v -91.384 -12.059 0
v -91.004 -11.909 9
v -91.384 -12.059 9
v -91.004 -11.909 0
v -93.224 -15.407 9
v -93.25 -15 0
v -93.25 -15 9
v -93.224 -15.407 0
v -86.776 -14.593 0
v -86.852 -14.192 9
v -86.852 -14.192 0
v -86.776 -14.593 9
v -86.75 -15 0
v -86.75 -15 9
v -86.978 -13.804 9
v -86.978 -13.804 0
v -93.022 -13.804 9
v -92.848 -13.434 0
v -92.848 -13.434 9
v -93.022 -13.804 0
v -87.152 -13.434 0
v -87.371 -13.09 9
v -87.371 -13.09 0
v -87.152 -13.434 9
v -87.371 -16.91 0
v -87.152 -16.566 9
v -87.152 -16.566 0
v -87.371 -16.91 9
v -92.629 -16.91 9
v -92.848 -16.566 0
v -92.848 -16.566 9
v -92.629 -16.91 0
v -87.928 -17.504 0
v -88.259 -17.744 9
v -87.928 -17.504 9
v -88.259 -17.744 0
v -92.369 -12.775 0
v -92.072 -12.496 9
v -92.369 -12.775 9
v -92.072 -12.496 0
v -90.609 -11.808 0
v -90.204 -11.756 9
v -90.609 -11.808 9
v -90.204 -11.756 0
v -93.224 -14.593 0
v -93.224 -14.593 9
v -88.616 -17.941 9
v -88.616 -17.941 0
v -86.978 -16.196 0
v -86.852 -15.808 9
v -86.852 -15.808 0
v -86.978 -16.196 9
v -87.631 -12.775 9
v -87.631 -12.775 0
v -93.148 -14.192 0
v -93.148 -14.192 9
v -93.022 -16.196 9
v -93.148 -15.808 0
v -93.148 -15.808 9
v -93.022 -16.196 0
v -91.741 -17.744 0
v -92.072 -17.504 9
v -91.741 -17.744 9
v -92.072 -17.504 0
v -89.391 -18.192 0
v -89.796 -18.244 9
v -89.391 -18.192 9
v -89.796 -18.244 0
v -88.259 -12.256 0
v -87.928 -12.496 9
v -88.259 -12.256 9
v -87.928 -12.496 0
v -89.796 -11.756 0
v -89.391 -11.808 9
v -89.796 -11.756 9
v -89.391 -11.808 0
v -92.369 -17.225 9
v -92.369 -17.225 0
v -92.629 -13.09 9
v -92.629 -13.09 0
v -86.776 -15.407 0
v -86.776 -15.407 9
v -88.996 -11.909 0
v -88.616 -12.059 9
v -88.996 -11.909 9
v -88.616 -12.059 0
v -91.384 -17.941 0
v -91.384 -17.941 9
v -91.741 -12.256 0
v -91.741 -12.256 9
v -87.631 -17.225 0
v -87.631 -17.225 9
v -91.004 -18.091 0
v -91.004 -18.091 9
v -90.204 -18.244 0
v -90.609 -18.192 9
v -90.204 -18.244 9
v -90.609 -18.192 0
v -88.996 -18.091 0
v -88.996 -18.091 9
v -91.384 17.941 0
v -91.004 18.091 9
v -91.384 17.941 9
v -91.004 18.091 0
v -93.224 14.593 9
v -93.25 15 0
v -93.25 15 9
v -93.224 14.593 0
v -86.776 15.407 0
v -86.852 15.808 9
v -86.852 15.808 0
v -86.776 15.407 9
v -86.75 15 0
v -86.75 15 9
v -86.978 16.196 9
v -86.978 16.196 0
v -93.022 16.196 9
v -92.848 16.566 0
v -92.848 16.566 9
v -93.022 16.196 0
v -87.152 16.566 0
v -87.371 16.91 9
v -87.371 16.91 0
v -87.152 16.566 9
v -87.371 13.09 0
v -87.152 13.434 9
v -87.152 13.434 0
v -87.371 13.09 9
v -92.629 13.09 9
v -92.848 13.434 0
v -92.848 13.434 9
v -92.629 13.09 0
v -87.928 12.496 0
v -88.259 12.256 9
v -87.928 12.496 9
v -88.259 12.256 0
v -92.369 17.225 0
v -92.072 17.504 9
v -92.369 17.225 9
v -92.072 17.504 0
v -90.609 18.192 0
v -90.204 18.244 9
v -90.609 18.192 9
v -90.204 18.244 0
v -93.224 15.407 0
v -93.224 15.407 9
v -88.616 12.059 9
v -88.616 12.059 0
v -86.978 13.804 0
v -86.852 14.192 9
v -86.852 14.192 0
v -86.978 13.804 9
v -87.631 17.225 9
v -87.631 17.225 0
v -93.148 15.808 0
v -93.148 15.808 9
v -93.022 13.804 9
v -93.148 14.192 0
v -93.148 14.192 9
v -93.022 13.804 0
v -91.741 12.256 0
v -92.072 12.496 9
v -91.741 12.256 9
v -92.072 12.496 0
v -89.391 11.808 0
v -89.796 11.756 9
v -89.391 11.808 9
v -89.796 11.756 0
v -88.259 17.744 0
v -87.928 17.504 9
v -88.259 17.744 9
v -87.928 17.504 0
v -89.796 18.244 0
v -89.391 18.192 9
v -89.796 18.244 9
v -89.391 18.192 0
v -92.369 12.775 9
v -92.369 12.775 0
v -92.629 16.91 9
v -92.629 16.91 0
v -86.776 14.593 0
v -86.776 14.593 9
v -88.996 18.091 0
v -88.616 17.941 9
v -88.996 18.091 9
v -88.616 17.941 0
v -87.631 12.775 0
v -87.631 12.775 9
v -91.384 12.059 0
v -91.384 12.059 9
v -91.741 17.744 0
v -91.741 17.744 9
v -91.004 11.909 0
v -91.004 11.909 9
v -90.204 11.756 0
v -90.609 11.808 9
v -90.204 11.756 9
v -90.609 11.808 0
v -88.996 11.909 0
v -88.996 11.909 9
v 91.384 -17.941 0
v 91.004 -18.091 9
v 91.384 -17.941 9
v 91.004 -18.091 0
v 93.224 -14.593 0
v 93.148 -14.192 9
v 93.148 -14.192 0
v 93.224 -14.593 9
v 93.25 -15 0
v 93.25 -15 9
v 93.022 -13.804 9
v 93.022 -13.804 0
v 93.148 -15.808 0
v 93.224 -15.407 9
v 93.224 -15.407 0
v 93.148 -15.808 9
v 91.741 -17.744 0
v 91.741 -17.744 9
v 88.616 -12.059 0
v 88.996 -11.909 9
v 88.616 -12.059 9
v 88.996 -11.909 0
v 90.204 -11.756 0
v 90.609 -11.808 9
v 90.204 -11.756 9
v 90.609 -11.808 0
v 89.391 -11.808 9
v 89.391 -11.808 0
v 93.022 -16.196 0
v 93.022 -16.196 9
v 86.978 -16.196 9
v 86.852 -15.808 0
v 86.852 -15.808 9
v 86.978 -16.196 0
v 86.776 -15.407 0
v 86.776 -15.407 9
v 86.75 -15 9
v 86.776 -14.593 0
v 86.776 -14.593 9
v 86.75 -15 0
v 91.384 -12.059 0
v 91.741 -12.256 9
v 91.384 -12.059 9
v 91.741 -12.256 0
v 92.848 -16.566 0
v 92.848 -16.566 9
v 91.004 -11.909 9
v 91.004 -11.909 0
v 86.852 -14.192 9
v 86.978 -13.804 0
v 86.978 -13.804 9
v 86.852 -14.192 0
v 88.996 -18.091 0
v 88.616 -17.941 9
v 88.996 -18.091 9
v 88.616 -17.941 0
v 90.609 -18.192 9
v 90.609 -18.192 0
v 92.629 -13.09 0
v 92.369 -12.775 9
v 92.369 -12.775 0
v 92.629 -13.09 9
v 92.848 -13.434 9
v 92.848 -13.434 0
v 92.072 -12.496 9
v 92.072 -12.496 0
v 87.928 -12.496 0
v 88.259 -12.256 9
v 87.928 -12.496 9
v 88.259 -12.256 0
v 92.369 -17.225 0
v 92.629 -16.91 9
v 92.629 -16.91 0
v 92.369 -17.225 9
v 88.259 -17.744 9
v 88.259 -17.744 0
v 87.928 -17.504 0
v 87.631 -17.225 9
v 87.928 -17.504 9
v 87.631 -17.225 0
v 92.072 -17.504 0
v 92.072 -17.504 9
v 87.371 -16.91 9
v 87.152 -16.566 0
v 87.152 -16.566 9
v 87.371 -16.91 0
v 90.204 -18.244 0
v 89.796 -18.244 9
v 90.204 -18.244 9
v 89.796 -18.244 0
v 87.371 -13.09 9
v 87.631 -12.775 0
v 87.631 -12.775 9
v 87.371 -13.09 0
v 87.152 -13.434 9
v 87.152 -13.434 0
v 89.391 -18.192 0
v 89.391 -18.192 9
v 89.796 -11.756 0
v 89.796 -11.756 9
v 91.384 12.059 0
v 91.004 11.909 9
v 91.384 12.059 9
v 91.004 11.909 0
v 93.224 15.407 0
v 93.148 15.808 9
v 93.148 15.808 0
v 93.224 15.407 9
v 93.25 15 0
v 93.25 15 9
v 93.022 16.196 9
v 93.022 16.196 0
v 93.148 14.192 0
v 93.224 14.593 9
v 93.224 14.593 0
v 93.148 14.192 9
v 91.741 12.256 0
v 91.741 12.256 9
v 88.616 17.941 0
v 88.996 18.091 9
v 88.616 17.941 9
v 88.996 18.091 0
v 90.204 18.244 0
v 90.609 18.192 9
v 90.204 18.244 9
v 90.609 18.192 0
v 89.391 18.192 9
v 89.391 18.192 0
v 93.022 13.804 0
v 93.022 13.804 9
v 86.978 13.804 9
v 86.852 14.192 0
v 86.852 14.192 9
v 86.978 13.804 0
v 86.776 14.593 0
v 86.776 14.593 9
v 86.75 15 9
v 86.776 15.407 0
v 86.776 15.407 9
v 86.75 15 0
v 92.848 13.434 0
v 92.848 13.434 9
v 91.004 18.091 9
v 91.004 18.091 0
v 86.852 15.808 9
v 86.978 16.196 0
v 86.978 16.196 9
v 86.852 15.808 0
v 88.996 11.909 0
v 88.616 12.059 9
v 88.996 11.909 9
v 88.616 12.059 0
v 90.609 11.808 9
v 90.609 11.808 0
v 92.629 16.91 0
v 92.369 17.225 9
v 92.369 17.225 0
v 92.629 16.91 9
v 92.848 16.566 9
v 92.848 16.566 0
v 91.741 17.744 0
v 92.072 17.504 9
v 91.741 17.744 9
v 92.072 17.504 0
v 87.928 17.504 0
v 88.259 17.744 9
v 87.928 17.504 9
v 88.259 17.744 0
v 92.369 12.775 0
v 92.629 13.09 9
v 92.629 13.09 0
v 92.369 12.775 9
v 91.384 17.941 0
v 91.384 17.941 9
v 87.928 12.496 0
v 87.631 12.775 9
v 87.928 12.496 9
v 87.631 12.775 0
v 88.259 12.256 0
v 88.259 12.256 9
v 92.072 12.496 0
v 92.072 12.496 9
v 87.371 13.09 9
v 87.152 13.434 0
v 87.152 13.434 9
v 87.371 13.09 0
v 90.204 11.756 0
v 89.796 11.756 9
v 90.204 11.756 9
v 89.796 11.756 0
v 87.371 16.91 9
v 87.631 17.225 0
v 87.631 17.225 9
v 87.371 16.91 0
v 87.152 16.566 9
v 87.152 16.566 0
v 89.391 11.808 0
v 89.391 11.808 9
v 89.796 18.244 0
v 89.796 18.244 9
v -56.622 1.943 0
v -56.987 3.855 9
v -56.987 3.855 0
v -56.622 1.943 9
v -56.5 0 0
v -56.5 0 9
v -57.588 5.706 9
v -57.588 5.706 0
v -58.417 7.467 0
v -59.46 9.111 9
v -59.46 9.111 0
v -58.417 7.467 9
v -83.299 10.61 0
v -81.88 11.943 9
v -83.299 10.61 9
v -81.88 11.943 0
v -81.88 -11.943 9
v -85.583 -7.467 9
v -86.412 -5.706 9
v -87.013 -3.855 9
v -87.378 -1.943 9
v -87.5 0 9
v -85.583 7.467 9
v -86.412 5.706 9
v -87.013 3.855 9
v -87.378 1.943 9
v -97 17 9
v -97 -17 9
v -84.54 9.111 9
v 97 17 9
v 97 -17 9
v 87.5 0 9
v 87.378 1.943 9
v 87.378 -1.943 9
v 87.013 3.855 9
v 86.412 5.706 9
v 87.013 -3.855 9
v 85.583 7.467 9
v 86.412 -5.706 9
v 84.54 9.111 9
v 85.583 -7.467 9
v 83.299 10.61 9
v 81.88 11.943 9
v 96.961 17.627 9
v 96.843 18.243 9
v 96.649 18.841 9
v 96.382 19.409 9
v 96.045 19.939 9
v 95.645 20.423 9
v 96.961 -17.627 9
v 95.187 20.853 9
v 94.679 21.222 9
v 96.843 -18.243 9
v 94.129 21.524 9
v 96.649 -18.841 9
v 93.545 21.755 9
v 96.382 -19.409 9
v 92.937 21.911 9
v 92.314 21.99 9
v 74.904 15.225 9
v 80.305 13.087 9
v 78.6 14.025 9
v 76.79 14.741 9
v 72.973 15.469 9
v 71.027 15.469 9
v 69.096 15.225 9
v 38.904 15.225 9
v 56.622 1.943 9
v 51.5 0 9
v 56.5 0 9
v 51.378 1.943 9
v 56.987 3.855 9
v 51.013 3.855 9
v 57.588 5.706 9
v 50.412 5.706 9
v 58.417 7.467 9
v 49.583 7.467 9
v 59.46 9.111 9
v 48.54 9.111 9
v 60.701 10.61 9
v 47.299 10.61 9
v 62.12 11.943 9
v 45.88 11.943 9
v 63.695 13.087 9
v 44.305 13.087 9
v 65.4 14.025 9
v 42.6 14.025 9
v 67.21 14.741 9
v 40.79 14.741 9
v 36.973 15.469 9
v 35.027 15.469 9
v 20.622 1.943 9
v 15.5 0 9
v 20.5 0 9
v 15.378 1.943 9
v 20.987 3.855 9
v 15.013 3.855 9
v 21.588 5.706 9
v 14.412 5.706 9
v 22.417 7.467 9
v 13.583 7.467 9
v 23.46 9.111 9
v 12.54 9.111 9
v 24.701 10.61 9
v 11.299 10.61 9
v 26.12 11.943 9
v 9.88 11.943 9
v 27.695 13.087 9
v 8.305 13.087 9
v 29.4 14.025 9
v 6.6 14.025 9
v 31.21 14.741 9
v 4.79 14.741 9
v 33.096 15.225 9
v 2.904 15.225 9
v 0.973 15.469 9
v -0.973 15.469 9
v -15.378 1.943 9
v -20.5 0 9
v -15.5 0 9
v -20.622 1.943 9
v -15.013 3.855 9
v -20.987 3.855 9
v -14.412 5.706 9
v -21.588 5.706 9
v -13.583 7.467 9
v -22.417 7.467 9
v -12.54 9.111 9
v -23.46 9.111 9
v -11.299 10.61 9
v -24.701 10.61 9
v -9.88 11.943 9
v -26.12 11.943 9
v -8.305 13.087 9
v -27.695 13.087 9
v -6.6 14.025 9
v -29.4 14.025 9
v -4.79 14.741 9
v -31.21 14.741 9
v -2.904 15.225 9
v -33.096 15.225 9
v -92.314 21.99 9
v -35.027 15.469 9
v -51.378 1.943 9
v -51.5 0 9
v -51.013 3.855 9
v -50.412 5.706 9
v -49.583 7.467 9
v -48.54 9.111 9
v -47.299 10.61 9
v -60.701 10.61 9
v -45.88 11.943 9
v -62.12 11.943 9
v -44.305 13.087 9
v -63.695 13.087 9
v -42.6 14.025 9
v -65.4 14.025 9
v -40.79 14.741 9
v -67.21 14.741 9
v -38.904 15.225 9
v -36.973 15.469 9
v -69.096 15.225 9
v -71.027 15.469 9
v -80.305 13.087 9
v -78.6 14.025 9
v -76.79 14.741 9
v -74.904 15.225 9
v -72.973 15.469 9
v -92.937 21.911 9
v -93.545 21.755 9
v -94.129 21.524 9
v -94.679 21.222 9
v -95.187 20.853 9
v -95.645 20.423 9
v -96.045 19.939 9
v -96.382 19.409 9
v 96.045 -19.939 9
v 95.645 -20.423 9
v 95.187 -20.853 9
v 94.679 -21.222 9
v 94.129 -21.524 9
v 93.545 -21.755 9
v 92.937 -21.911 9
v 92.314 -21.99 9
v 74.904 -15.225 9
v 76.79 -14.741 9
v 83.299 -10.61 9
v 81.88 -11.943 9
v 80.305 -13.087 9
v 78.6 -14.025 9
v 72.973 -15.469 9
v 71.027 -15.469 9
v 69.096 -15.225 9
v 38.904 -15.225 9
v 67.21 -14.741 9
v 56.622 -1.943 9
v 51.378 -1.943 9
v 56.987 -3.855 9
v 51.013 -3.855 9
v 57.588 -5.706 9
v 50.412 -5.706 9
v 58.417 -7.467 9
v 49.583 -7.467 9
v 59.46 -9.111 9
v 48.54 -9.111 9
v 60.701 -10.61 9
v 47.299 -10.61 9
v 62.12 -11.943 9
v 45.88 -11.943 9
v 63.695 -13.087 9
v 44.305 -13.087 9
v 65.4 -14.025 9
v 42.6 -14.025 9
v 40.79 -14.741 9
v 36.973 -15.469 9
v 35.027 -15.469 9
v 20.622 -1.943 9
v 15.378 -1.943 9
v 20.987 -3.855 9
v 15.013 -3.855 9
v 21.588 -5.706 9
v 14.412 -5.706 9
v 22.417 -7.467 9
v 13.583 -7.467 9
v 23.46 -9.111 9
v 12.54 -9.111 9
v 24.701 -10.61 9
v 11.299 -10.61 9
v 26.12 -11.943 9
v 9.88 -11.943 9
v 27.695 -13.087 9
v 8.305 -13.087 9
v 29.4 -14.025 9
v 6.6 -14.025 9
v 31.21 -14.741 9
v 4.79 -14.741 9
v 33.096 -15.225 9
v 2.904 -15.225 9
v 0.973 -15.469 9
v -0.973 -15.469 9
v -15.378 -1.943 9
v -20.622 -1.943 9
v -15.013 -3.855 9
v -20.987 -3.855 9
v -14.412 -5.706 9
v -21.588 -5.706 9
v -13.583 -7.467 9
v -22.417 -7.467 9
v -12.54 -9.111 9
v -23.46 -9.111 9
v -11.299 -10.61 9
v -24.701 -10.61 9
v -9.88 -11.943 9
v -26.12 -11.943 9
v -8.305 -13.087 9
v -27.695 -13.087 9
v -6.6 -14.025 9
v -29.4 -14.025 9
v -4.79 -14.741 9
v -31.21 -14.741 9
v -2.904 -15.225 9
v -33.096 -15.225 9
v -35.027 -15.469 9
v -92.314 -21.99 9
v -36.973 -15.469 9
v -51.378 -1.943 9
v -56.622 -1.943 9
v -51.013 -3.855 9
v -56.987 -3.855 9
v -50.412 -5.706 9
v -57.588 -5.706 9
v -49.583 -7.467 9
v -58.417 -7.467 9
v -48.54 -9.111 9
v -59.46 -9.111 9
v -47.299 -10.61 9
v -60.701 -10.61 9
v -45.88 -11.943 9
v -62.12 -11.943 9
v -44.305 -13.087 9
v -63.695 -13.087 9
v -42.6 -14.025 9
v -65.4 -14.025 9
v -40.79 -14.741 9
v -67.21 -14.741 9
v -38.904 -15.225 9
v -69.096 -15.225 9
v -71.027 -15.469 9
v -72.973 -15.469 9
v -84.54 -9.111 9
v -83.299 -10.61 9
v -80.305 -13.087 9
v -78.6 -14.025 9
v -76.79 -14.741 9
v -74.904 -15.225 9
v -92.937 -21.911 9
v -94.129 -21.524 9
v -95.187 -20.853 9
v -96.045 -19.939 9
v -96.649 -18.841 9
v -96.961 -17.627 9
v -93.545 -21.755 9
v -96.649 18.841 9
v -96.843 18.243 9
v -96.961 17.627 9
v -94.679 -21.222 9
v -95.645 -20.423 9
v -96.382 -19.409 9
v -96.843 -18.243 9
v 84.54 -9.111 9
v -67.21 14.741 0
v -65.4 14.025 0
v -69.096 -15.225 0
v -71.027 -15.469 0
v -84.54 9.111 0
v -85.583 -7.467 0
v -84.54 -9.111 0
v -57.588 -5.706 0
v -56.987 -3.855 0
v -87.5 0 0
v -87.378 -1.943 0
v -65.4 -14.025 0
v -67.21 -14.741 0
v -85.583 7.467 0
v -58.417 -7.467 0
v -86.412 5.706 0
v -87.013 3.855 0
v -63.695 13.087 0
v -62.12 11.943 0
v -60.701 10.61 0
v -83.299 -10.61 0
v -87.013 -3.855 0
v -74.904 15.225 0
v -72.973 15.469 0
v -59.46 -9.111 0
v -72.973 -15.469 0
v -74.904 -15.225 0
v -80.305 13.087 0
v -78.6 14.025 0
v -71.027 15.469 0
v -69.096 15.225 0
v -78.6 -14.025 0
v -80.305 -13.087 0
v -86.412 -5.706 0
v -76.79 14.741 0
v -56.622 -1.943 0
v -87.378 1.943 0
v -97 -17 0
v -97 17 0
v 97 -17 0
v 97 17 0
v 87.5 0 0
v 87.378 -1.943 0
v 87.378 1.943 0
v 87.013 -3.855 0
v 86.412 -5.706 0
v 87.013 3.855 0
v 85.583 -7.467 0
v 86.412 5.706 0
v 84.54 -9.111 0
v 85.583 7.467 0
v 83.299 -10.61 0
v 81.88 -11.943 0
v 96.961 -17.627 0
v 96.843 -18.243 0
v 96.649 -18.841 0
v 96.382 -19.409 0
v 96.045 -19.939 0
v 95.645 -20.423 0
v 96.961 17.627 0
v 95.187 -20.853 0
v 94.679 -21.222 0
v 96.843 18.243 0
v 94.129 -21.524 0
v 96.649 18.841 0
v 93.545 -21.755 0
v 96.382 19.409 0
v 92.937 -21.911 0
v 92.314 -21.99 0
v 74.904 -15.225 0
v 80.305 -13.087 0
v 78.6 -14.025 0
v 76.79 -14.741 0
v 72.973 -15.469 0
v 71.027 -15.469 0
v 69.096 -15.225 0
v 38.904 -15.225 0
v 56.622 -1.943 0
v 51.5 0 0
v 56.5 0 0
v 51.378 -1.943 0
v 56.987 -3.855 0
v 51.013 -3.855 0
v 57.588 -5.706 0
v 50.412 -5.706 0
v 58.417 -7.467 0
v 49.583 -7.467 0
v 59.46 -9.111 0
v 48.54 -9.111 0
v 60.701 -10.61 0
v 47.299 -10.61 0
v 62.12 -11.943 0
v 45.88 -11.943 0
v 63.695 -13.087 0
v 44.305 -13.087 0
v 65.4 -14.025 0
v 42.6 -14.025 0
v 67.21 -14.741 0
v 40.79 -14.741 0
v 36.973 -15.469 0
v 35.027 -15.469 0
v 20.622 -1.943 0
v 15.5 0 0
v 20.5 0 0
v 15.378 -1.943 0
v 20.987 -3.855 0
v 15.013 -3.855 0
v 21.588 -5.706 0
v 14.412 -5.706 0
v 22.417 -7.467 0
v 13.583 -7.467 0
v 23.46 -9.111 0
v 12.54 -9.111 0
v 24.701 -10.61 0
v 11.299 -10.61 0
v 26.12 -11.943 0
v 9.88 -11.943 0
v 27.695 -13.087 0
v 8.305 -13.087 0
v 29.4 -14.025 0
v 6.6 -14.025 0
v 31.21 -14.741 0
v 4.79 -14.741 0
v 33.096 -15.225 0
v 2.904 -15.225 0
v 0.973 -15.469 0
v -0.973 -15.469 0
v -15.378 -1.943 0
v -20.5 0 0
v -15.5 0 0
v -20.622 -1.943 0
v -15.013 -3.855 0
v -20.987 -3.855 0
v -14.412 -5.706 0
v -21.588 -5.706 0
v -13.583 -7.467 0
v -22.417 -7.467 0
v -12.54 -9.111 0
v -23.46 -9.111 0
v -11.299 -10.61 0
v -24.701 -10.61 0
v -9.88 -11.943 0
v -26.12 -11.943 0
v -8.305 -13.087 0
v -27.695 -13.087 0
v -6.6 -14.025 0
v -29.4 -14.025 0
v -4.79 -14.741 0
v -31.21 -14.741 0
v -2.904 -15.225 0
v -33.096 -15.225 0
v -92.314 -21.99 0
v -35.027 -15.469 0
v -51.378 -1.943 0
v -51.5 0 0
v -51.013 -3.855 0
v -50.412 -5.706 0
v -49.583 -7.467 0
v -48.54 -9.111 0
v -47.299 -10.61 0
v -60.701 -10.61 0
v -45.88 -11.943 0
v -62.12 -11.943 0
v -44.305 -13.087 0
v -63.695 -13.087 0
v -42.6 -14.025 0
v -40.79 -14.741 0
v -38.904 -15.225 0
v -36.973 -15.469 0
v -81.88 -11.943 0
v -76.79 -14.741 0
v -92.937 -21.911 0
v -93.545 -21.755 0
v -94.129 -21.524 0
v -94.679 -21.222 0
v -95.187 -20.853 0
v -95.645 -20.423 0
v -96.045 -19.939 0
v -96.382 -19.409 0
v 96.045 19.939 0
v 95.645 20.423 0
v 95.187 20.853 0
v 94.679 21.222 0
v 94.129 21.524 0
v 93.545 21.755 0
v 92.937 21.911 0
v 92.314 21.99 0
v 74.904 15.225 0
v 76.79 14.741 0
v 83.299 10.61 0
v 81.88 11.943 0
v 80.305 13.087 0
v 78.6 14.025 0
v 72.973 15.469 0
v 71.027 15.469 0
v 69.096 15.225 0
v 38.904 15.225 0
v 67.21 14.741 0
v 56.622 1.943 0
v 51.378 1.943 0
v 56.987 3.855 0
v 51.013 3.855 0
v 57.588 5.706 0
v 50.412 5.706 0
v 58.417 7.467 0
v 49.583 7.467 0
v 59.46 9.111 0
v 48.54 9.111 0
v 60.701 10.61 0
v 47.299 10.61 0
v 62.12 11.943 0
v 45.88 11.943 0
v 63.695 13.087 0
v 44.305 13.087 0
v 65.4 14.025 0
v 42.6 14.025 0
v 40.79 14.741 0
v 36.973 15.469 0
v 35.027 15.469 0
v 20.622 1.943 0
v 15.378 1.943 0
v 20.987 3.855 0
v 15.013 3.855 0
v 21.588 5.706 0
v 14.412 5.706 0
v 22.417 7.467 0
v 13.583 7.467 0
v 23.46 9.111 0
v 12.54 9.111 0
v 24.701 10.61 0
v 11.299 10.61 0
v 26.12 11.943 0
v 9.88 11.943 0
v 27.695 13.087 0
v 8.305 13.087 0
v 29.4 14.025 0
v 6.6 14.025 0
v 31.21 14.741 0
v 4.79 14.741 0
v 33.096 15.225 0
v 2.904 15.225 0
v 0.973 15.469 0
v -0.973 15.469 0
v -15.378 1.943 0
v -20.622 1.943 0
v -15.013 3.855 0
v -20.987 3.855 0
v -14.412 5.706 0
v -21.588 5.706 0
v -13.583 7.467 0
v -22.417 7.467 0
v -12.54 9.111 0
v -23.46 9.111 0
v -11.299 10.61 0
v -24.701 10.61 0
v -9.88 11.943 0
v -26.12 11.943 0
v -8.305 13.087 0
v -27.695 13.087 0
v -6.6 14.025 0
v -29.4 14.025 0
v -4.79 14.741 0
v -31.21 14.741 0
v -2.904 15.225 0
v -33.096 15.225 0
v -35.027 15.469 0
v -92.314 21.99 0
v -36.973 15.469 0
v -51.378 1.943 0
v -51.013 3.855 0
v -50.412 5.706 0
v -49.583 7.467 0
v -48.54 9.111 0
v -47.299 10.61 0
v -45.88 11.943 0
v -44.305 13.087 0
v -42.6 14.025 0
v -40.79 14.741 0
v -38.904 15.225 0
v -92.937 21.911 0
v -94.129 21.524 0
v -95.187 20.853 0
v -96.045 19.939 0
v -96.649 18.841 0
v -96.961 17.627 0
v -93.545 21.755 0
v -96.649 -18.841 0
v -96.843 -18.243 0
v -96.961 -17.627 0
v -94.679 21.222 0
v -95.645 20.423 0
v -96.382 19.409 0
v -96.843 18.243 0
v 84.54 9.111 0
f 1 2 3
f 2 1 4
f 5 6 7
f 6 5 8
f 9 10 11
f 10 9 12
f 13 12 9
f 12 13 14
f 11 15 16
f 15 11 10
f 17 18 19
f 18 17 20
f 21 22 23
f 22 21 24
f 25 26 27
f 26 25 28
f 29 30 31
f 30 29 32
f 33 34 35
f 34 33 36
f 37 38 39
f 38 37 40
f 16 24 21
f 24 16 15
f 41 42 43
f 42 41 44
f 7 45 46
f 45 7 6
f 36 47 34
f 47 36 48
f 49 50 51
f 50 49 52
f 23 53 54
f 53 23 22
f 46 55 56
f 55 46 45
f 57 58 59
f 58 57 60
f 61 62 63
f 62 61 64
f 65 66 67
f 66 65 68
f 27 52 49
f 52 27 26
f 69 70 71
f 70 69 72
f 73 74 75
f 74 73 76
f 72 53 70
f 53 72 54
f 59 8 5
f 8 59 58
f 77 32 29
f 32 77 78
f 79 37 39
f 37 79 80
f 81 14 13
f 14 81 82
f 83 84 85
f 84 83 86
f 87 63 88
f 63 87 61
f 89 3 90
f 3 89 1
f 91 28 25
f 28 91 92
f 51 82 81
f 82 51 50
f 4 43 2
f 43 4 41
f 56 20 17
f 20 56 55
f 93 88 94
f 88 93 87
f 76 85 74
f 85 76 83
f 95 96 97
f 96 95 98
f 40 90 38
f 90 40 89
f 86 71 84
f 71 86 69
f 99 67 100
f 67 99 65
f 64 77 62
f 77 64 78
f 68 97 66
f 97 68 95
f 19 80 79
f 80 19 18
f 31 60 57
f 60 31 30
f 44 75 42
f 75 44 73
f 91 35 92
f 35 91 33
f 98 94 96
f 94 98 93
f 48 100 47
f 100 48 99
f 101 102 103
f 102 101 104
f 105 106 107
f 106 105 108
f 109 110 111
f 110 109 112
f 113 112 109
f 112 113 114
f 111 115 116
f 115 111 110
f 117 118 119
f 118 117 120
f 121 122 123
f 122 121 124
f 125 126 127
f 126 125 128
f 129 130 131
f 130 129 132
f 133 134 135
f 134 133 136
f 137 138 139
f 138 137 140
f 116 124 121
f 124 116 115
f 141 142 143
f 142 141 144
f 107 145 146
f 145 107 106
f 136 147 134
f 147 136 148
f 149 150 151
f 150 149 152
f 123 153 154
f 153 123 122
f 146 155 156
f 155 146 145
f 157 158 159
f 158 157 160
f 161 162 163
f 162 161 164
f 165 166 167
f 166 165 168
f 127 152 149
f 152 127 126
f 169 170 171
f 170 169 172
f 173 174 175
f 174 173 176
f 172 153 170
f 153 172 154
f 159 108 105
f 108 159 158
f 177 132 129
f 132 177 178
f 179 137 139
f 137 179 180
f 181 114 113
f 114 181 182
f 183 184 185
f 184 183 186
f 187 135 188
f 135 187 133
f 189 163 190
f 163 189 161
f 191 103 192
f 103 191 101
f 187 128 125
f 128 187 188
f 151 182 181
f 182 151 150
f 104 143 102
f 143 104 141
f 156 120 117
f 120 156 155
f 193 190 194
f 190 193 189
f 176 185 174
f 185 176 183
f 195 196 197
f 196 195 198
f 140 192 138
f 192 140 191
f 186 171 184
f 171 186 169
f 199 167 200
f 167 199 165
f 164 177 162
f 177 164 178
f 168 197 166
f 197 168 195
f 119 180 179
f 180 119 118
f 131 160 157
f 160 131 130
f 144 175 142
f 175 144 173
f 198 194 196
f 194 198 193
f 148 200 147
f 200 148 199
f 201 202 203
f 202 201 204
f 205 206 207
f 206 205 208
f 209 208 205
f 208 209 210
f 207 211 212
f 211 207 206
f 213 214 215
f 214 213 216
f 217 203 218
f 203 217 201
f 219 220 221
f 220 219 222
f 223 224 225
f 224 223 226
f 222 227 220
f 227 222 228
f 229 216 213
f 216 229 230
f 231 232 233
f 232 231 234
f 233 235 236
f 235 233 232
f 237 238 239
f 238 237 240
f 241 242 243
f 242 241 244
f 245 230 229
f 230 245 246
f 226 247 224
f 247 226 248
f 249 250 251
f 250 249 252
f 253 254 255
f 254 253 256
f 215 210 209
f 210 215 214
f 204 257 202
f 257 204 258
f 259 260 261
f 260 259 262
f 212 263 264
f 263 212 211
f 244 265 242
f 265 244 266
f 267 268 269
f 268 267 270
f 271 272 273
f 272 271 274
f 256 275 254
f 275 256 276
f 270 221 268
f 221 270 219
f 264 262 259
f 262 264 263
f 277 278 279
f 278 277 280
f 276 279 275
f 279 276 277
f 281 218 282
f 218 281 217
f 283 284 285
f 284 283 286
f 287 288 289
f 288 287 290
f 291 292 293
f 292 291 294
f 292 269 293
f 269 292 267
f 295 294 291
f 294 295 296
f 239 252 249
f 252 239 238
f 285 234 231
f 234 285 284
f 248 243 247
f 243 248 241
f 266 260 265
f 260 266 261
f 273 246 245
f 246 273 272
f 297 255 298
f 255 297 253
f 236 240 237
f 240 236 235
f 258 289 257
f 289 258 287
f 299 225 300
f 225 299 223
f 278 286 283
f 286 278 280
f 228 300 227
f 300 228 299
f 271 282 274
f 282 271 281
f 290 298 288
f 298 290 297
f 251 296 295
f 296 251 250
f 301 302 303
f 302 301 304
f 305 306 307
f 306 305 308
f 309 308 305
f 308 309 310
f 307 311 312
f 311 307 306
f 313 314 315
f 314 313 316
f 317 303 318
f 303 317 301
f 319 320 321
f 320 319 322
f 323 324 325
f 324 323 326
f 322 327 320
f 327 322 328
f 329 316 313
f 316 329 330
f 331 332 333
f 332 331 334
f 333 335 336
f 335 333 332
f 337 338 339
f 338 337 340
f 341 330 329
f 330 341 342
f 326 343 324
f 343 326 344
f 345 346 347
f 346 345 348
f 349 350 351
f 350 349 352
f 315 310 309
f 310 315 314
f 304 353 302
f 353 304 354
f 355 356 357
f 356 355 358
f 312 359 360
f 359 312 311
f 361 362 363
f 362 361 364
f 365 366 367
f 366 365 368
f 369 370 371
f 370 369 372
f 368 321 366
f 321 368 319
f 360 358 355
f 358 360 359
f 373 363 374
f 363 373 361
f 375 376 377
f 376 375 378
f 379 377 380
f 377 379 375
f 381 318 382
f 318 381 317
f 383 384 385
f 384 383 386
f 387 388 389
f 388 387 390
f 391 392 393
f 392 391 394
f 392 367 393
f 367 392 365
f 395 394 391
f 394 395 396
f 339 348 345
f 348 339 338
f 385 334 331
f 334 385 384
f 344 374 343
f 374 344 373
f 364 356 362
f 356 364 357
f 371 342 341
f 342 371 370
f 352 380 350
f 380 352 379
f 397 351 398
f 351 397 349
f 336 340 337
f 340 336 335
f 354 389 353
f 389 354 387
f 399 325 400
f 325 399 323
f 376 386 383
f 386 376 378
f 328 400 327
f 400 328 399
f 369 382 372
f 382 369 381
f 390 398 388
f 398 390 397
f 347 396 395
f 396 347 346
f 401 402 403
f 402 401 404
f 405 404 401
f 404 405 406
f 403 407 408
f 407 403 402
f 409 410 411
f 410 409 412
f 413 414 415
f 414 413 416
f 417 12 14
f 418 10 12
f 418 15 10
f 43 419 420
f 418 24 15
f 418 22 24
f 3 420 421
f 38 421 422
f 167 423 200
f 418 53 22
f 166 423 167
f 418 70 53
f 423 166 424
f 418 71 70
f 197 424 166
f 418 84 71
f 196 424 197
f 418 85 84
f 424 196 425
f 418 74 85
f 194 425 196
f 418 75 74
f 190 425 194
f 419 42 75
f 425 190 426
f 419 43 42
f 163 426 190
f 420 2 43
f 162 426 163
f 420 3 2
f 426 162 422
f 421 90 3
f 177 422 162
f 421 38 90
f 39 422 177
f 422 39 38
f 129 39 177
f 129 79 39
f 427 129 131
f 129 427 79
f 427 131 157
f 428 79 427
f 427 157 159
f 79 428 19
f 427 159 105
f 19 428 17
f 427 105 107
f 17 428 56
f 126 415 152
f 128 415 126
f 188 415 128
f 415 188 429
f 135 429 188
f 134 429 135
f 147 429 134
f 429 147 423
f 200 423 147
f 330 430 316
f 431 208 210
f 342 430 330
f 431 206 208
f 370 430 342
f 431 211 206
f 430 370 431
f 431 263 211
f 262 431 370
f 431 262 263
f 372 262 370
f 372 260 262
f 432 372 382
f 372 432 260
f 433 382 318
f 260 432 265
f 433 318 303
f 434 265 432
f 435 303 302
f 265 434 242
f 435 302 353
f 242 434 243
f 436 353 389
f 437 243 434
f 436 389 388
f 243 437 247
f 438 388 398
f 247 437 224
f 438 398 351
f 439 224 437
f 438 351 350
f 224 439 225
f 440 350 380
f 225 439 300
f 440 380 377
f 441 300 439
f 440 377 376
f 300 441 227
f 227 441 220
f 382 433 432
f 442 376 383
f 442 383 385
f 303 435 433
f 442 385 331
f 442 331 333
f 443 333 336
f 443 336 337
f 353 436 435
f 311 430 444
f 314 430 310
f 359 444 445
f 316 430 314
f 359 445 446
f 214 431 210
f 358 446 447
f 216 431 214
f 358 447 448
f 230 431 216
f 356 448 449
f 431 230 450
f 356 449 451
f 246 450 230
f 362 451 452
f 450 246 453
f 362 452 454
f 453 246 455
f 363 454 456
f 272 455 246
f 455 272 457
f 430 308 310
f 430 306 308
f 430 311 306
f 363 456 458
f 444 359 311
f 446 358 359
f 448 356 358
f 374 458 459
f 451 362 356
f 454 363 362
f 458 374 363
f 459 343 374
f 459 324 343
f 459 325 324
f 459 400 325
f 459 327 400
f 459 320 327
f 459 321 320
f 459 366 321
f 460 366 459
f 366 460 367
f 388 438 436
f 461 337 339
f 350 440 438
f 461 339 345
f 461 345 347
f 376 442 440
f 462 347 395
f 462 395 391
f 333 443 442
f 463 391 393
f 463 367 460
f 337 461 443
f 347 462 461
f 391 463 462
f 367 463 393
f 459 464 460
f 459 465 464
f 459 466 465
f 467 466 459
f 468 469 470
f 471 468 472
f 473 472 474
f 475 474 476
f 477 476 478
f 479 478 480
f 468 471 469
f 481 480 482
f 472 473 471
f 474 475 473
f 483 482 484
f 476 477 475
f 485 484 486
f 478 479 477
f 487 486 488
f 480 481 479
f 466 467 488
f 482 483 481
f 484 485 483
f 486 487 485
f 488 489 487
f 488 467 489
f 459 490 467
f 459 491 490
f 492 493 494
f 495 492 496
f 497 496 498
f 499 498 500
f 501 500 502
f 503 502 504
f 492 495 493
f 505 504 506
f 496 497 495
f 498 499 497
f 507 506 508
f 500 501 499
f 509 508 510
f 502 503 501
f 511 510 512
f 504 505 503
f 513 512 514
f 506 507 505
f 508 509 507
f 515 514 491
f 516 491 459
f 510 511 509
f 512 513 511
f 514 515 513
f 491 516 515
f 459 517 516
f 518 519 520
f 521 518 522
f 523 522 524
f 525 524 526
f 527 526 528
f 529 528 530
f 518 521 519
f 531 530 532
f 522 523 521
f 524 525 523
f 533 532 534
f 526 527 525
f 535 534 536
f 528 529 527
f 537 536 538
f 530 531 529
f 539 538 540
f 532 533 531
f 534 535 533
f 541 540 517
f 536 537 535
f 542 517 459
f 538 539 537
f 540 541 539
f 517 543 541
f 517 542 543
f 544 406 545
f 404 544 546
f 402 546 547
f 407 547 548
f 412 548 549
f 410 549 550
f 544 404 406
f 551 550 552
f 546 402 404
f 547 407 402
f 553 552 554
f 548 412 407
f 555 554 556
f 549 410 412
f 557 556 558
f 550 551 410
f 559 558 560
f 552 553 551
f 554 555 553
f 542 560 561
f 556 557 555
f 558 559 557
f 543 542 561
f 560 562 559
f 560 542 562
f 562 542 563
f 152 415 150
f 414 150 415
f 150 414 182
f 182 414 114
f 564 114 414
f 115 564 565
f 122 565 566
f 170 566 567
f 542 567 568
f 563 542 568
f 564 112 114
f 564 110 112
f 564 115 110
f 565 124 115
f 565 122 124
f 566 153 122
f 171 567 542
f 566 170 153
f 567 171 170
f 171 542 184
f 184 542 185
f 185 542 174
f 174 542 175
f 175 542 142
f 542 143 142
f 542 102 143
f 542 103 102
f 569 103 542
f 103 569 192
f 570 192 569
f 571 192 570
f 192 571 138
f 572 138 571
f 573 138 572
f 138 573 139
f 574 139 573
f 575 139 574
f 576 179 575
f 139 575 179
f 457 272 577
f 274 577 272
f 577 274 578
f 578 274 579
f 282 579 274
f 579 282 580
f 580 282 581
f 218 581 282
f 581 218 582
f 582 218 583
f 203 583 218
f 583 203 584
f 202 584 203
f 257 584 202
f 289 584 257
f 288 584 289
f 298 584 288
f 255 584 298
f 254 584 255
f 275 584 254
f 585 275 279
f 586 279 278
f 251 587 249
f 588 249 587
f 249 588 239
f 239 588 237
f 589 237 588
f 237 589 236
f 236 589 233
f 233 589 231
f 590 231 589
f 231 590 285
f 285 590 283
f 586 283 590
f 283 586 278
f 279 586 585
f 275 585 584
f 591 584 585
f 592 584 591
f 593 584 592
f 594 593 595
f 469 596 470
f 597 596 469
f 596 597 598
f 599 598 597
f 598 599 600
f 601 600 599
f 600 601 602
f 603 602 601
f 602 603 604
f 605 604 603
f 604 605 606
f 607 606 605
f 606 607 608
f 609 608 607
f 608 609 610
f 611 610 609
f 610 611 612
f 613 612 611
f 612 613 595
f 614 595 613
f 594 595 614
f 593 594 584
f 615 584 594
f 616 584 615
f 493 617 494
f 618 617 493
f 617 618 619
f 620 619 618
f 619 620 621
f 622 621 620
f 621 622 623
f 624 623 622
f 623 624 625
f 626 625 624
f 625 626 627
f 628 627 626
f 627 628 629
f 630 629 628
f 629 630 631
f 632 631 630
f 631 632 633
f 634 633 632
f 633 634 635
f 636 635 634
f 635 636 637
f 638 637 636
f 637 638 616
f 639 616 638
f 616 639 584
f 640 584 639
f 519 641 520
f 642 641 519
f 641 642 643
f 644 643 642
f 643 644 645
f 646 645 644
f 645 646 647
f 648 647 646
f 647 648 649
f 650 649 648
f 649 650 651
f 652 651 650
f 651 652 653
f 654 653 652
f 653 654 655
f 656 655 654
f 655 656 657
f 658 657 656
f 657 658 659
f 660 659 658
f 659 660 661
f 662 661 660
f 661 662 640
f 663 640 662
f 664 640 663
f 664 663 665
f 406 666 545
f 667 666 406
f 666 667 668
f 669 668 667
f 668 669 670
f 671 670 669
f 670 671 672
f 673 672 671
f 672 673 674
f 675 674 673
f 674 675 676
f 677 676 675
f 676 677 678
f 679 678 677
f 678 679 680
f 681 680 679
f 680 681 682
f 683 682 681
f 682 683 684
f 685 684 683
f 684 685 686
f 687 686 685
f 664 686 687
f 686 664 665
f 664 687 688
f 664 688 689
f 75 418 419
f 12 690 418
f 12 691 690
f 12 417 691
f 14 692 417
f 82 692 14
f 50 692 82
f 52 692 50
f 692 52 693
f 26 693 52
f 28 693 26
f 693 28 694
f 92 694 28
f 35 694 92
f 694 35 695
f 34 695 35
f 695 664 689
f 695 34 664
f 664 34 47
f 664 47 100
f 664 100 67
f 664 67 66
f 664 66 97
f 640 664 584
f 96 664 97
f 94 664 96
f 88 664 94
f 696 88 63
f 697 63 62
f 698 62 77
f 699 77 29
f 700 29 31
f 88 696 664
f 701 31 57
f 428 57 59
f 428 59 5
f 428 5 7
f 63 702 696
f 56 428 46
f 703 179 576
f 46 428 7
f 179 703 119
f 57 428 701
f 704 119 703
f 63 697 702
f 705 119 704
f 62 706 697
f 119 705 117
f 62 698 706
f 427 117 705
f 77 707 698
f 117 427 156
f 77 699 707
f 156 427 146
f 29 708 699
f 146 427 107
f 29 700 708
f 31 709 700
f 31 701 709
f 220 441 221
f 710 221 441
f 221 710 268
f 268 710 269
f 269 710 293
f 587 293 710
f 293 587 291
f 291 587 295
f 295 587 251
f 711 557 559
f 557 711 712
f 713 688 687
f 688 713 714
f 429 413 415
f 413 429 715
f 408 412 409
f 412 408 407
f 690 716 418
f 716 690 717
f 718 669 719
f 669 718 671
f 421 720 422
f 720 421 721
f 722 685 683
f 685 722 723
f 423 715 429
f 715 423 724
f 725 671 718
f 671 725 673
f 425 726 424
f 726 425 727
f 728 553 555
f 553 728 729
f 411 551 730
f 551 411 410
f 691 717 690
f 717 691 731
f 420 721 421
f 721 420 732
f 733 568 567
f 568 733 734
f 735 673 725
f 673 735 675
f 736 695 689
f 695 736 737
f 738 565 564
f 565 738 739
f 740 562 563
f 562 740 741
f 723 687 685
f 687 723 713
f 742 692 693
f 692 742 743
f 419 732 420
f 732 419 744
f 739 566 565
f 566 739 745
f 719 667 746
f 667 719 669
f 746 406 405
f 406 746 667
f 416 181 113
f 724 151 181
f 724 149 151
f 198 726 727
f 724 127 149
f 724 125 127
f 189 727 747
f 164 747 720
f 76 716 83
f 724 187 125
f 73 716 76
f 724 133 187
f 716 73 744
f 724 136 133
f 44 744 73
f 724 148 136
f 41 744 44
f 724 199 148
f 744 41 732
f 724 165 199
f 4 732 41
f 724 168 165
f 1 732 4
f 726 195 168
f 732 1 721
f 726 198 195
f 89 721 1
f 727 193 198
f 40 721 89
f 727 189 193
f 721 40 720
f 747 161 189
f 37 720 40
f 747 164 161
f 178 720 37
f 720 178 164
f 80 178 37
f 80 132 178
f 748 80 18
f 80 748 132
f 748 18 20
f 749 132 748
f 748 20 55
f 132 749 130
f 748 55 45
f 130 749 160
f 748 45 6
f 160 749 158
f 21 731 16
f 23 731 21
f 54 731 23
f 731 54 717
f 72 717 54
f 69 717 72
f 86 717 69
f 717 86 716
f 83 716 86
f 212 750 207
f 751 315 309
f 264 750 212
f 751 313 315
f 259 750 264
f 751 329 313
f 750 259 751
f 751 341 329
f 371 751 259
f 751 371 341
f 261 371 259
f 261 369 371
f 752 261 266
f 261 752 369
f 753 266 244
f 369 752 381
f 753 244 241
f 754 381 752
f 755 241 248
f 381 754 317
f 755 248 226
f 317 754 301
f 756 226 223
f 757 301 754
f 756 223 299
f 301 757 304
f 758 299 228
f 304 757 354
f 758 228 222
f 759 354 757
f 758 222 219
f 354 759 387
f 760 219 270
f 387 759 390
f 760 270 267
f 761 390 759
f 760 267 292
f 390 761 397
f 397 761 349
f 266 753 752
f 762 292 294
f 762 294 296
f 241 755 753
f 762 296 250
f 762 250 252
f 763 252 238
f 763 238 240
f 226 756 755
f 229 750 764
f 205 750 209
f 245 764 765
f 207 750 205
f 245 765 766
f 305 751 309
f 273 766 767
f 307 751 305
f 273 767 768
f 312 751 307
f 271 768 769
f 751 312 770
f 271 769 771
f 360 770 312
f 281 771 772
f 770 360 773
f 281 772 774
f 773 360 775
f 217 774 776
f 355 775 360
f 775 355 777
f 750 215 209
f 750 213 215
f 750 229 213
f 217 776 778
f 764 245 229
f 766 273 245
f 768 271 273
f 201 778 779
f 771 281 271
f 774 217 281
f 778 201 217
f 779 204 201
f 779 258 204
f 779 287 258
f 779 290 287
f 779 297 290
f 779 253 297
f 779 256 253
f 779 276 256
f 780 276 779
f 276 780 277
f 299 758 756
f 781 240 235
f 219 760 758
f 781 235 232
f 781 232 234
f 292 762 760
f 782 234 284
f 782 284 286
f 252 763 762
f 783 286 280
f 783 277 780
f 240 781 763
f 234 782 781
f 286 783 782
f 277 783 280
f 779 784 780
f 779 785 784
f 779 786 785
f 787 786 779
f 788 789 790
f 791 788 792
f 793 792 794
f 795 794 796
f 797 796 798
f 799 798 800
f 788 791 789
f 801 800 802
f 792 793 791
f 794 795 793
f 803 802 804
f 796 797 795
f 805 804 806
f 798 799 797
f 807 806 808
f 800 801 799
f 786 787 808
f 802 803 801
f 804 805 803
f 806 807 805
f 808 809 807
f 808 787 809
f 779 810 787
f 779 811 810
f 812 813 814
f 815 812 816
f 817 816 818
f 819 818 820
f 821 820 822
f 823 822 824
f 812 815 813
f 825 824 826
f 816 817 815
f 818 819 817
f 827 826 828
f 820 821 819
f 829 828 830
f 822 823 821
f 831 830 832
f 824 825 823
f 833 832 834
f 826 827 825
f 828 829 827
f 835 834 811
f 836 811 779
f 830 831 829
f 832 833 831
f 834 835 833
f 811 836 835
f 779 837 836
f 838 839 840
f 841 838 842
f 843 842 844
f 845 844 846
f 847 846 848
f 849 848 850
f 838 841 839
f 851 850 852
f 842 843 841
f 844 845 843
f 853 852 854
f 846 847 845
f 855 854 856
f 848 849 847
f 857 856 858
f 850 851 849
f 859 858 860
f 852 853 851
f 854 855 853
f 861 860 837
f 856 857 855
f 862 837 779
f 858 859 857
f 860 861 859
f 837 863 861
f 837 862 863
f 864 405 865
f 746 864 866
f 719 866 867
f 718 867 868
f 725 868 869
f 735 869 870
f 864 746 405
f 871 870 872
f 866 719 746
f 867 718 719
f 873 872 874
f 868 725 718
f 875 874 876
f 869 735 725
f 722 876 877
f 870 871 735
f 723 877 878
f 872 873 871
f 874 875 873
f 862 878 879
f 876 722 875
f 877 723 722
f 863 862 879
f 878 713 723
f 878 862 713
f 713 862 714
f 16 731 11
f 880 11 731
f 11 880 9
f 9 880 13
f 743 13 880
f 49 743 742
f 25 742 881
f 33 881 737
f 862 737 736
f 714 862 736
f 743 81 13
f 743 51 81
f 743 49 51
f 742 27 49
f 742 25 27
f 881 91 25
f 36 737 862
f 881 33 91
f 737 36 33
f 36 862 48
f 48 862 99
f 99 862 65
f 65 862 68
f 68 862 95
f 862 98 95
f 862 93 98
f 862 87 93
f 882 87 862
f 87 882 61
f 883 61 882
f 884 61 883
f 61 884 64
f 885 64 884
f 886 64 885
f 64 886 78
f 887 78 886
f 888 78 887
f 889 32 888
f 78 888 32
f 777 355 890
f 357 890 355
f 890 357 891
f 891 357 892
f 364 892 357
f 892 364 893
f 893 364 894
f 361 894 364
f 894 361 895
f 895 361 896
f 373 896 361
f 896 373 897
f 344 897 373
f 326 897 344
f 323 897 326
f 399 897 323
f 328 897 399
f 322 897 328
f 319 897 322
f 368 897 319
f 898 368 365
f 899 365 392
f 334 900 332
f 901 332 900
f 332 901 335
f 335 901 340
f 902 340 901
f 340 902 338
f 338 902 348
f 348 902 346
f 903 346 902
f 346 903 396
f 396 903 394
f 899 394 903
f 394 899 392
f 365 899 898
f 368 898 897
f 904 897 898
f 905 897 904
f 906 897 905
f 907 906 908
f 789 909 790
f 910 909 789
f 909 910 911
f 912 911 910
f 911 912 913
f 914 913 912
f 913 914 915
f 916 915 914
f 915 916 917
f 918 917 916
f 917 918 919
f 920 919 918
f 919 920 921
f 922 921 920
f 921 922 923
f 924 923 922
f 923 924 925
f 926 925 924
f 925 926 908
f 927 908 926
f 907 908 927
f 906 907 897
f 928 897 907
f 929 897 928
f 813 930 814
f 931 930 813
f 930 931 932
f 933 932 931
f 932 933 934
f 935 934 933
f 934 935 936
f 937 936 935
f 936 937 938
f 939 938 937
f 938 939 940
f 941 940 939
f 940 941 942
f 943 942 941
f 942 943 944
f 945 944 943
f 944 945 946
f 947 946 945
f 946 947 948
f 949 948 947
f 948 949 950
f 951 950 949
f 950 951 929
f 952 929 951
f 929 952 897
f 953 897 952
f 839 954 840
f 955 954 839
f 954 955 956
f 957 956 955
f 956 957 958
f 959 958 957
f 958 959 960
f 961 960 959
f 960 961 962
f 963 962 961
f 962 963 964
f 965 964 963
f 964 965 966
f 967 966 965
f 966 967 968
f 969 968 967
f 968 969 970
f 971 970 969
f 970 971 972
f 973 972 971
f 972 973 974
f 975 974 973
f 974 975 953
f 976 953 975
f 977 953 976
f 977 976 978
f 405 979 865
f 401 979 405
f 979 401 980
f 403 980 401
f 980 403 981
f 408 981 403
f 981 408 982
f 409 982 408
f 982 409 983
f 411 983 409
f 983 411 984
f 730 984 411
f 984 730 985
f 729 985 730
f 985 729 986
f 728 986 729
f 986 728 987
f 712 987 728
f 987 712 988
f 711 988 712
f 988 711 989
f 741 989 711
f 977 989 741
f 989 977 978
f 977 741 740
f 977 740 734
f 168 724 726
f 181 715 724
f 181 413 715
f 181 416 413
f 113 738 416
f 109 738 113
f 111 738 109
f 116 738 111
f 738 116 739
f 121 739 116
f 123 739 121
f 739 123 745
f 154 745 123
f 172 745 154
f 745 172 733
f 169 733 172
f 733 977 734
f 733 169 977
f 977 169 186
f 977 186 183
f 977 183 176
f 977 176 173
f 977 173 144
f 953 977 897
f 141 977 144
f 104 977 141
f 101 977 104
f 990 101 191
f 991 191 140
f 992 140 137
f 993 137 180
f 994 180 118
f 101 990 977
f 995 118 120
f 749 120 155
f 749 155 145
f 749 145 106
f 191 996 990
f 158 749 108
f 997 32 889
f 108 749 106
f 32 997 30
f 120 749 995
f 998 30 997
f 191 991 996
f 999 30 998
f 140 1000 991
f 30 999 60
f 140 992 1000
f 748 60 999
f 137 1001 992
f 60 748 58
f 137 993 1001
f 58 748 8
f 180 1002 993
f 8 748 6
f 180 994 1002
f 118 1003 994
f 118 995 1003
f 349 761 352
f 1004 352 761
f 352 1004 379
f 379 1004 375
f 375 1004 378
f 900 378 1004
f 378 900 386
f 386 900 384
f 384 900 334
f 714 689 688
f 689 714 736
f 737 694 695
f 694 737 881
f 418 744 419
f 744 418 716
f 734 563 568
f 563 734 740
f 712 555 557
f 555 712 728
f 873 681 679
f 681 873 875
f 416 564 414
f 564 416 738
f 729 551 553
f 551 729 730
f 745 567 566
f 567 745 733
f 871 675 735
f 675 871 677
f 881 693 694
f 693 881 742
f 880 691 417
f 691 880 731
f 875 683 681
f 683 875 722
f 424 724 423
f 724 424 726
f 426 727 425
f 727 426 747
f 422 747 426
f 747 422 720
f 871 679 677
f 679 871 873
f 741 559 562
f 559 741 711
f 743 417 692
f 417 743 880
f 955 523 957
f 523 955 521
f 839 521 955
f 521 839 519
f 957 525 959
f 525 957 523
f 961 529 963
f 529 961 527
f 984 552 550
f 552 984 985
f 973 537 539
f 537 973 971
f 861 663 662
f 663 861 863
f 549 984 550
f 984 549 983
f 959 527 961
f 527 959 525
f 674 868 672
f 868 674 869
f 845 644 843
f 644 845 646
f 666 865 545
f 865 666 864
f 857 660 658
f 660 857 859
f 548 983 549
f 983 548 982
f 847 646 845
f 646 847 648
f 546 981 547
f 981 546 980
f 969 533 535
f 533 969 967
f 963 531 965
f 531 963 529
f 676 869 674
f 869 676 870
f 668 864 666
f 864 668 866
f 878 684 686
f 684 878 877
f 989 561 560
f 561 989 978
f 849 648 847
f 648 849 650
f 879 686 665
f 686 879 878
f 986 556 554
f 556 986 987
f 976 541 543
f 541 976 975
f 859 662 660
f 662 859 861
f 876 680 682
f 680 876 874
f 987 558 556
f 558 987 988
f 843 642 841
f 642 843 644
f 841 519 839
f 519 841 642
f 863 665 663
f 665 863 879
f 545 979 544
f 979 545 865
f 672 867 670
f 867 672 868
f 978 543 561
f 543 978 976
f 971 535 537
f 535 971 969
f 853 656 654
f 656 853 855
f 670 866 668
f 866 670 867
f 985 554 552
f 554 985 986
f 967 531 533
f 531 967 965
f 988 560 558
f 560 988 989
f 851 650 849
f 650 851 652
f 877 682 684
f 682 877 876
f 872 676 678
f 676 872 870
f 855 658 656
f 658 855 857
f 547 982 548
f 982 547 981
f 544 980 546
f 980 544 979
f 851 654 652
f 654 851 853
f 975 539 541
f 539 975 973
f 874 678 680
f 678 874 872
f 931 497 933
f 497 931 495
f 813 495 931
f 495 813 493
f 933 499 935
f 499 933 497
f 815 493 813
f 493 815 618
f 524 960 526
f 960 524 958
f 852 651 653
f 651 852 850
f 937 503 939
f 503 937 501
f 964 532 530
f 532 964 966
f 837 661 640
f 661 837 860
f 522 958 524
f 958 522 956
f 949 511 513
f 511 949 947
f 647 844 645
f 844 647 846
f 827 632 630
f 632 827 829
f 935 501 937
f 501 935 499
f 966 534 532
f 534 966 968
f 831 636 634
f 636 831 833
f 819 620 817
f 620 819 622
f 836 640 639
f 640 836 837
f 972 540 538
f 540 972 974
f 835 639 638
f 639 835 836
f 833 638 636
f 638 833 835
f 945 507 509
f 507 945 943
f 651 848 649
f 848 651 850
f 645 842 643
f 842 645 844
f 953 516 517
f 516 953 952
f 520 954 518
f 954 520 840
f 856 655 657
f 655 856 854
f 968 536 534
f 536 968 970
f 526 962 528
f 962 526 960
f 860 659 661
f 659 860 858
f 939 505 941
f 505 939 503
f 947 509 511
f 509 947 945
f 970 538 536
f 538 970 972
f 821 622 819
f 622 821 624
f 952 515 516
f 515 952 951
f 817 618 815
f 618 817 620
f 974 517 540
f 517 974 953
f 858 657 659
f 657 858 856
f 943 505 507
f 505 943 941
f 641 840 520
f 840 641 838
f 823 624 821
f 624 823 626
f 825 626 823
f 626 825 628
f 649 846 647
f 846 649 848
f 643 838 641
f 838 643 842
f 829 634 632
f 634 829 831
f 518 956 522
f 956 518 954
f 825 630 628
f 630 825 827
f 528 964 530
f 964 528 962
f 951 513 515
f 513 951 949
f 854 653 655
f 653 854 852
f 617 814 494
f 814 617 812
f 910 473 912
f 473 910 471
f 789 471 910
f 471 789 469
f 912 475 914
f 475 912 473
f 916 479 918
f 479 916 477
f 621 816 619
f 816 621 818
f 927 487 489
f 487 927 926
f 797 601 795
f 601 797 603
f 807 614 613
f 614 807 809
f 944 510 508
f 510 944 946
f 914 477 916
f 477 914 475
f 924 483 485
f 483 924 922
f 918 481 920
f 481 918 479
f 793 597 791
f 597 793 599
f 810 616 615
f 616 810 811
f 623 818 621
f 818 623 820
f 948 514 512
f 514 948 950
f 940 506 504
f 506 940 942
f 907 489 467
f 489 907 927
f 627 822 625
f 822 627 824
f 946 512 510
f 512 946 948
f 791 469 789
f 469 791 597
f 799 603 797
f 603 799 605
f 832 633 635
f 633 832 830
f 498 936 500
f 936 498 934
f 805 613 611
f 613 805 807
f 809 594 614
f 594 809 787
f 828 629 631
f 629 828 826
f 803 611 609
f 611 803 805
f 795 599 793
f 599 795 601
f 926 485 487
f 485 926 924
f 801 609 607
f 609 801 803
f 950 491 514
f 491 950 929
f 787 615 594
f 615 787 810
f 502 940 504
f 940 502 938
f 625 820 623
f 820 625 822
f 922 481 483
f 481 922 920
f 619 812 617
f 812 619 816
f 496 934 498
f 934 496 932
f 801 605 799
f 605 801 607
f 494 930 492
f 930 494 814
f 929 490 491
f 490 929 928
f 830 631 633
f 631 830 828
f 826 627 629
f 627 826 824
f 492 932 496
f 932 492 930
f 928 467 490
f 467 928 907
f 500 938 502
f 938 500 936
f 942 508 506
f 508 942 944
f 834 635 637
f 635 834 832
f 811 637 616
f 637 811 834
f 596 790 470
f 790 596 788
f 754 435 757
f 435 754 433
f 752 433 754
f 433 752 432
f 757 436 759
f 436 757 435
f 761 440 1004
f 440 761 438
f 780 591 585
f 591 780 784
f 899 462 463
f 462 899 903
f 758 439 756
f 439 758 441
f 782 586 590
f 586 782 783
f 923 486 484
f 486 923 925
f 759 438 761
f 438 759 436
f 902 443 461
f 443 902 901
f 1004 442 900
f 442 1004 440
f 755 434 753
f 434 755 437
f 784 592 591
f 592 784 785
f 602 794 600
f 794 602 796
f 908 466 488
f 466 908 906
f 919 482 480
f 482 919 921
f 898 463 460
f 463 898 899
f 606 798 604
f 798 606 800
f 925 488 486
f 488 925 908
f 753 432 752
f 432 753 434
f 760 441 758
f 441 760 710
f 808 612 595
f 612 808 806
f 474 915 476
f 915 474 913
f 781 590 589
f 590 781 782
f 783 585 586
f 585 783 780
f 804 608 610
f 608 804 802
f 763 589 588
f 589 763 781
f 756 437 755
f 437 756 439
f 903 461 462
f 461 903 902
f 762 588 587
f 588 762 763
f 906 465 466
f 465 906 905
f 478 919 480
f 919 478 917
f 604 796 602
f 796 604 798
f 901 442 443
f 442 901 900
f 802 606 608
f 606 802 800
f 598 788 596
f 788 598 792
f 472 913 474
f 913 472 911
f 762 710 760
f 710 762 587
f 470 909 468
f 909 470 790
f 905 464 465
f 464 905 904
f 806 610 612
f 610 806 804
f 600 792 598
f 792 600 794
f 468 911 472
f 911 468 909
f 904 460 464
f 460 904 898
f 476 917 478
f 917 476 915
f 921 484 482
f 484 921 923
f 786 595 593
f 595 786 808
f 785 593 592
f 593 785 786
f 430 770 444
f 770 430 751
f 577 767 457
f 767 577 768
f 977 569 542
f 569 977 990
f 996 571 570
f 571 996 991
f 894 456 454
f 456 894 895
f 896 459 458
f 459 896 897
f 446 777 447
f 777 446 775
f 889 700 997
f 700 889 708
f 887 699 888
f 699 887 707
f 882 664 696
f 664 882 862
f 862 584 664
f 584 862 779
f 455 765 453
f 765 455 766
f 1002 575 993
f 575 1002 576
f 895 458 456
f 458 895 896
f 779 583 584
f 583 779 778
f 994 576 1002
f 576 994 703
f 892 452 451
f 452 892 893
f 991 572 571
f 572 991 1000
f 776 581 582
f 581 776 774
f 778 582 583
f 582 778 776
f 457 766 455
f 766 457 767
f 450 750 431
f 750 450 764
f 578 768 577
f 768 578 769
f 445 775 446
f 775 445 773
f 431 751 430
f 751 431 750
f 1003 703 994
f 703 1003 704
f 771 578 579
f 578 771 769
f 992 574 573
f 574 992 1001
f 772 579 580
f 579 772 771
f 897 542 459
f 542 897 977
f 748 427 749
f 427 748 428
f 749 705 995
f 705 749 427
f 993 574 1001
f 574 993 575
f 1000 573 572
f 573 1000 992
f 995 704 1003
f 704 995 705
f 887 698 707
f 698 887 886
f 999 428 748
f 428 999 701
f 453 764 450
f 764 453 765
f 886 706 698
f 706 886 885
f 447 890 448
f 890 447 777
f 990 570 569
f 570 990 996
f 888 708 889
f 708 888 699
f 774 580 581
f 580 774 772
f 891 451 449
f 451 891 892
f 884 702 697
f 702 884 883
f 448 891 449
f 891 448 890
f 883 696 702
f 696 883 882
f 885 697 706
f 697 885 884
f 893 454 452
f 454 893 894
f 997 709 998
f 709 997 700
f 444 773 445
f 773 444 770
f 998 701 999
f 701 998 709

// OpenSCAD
$fn = 50;

difference() {
	union() {
		hull() {
			translate(v = [-92.0, 17.0, 0]) {
				cylinder(h = 9, r = 5);
			}
			translate(v = [92.0, 17.0, 0]) {
				cylinder(h = 9, r = 5);
			}
			translate(v = [-92.0, -17.0, 0]) {
				cylinder(h = 9, r = 5);
			}
			translate(v = [92.0, -17.0, 0]) {
				cylinder(h = 9, r = 5);
			}
		}
	}
	union() {
		translate(v = [-90.0, -15.0, -100.0]) {
			cylinder(h = 200, r = 3.25);
		}
		translate(v = [-90.0, 15.0, -100.0]) {
			cylinder(h = 200, r = 3.25);
		}
		translate(v = [90.0, -15.0, -100.0]) {
			cylinder(h = 200, r = 3.25);
		}
		translate(v = [90.0, 15.0, -100.0]) {
			cylinder(h = 200, r = 3.25);
		}
		translate(v = [-90.0, -15.0, -100.0]) {
			cylinder(h = 200, r = 1.8);
		}
		translate(v = [-90.0, 15.0, -100.0]) {
			cylinder(h = 200, r = 1.8);
		}
		translate(v = [90.0, -15.0, -100.0]) {
			cylinder(h = 200, r = 1.8);
		}
		translate(v = [90.0, 15.0, -100.0]) {
			cylinder(h = 200, r = 1.8);
		}
		translate(v = [-72.0, 0, 0.0]) {
			cylinder(h = 9, r = 15.5);
		}
		translate(v = [-36.0, 0, 0.0]) {
			cylinder(h = 9, r = 15.5);
		}
		cylinder(h = 9, r = 15.5);
		translate(v = [36.0, 0, 0.0]) {
			cylinder(h = 9, r = 15.5);
		}
		translate(v = [72.0, 0, 0.0]) {
			cylinder(h = 9, r = 15.5);
		}
	}
}
